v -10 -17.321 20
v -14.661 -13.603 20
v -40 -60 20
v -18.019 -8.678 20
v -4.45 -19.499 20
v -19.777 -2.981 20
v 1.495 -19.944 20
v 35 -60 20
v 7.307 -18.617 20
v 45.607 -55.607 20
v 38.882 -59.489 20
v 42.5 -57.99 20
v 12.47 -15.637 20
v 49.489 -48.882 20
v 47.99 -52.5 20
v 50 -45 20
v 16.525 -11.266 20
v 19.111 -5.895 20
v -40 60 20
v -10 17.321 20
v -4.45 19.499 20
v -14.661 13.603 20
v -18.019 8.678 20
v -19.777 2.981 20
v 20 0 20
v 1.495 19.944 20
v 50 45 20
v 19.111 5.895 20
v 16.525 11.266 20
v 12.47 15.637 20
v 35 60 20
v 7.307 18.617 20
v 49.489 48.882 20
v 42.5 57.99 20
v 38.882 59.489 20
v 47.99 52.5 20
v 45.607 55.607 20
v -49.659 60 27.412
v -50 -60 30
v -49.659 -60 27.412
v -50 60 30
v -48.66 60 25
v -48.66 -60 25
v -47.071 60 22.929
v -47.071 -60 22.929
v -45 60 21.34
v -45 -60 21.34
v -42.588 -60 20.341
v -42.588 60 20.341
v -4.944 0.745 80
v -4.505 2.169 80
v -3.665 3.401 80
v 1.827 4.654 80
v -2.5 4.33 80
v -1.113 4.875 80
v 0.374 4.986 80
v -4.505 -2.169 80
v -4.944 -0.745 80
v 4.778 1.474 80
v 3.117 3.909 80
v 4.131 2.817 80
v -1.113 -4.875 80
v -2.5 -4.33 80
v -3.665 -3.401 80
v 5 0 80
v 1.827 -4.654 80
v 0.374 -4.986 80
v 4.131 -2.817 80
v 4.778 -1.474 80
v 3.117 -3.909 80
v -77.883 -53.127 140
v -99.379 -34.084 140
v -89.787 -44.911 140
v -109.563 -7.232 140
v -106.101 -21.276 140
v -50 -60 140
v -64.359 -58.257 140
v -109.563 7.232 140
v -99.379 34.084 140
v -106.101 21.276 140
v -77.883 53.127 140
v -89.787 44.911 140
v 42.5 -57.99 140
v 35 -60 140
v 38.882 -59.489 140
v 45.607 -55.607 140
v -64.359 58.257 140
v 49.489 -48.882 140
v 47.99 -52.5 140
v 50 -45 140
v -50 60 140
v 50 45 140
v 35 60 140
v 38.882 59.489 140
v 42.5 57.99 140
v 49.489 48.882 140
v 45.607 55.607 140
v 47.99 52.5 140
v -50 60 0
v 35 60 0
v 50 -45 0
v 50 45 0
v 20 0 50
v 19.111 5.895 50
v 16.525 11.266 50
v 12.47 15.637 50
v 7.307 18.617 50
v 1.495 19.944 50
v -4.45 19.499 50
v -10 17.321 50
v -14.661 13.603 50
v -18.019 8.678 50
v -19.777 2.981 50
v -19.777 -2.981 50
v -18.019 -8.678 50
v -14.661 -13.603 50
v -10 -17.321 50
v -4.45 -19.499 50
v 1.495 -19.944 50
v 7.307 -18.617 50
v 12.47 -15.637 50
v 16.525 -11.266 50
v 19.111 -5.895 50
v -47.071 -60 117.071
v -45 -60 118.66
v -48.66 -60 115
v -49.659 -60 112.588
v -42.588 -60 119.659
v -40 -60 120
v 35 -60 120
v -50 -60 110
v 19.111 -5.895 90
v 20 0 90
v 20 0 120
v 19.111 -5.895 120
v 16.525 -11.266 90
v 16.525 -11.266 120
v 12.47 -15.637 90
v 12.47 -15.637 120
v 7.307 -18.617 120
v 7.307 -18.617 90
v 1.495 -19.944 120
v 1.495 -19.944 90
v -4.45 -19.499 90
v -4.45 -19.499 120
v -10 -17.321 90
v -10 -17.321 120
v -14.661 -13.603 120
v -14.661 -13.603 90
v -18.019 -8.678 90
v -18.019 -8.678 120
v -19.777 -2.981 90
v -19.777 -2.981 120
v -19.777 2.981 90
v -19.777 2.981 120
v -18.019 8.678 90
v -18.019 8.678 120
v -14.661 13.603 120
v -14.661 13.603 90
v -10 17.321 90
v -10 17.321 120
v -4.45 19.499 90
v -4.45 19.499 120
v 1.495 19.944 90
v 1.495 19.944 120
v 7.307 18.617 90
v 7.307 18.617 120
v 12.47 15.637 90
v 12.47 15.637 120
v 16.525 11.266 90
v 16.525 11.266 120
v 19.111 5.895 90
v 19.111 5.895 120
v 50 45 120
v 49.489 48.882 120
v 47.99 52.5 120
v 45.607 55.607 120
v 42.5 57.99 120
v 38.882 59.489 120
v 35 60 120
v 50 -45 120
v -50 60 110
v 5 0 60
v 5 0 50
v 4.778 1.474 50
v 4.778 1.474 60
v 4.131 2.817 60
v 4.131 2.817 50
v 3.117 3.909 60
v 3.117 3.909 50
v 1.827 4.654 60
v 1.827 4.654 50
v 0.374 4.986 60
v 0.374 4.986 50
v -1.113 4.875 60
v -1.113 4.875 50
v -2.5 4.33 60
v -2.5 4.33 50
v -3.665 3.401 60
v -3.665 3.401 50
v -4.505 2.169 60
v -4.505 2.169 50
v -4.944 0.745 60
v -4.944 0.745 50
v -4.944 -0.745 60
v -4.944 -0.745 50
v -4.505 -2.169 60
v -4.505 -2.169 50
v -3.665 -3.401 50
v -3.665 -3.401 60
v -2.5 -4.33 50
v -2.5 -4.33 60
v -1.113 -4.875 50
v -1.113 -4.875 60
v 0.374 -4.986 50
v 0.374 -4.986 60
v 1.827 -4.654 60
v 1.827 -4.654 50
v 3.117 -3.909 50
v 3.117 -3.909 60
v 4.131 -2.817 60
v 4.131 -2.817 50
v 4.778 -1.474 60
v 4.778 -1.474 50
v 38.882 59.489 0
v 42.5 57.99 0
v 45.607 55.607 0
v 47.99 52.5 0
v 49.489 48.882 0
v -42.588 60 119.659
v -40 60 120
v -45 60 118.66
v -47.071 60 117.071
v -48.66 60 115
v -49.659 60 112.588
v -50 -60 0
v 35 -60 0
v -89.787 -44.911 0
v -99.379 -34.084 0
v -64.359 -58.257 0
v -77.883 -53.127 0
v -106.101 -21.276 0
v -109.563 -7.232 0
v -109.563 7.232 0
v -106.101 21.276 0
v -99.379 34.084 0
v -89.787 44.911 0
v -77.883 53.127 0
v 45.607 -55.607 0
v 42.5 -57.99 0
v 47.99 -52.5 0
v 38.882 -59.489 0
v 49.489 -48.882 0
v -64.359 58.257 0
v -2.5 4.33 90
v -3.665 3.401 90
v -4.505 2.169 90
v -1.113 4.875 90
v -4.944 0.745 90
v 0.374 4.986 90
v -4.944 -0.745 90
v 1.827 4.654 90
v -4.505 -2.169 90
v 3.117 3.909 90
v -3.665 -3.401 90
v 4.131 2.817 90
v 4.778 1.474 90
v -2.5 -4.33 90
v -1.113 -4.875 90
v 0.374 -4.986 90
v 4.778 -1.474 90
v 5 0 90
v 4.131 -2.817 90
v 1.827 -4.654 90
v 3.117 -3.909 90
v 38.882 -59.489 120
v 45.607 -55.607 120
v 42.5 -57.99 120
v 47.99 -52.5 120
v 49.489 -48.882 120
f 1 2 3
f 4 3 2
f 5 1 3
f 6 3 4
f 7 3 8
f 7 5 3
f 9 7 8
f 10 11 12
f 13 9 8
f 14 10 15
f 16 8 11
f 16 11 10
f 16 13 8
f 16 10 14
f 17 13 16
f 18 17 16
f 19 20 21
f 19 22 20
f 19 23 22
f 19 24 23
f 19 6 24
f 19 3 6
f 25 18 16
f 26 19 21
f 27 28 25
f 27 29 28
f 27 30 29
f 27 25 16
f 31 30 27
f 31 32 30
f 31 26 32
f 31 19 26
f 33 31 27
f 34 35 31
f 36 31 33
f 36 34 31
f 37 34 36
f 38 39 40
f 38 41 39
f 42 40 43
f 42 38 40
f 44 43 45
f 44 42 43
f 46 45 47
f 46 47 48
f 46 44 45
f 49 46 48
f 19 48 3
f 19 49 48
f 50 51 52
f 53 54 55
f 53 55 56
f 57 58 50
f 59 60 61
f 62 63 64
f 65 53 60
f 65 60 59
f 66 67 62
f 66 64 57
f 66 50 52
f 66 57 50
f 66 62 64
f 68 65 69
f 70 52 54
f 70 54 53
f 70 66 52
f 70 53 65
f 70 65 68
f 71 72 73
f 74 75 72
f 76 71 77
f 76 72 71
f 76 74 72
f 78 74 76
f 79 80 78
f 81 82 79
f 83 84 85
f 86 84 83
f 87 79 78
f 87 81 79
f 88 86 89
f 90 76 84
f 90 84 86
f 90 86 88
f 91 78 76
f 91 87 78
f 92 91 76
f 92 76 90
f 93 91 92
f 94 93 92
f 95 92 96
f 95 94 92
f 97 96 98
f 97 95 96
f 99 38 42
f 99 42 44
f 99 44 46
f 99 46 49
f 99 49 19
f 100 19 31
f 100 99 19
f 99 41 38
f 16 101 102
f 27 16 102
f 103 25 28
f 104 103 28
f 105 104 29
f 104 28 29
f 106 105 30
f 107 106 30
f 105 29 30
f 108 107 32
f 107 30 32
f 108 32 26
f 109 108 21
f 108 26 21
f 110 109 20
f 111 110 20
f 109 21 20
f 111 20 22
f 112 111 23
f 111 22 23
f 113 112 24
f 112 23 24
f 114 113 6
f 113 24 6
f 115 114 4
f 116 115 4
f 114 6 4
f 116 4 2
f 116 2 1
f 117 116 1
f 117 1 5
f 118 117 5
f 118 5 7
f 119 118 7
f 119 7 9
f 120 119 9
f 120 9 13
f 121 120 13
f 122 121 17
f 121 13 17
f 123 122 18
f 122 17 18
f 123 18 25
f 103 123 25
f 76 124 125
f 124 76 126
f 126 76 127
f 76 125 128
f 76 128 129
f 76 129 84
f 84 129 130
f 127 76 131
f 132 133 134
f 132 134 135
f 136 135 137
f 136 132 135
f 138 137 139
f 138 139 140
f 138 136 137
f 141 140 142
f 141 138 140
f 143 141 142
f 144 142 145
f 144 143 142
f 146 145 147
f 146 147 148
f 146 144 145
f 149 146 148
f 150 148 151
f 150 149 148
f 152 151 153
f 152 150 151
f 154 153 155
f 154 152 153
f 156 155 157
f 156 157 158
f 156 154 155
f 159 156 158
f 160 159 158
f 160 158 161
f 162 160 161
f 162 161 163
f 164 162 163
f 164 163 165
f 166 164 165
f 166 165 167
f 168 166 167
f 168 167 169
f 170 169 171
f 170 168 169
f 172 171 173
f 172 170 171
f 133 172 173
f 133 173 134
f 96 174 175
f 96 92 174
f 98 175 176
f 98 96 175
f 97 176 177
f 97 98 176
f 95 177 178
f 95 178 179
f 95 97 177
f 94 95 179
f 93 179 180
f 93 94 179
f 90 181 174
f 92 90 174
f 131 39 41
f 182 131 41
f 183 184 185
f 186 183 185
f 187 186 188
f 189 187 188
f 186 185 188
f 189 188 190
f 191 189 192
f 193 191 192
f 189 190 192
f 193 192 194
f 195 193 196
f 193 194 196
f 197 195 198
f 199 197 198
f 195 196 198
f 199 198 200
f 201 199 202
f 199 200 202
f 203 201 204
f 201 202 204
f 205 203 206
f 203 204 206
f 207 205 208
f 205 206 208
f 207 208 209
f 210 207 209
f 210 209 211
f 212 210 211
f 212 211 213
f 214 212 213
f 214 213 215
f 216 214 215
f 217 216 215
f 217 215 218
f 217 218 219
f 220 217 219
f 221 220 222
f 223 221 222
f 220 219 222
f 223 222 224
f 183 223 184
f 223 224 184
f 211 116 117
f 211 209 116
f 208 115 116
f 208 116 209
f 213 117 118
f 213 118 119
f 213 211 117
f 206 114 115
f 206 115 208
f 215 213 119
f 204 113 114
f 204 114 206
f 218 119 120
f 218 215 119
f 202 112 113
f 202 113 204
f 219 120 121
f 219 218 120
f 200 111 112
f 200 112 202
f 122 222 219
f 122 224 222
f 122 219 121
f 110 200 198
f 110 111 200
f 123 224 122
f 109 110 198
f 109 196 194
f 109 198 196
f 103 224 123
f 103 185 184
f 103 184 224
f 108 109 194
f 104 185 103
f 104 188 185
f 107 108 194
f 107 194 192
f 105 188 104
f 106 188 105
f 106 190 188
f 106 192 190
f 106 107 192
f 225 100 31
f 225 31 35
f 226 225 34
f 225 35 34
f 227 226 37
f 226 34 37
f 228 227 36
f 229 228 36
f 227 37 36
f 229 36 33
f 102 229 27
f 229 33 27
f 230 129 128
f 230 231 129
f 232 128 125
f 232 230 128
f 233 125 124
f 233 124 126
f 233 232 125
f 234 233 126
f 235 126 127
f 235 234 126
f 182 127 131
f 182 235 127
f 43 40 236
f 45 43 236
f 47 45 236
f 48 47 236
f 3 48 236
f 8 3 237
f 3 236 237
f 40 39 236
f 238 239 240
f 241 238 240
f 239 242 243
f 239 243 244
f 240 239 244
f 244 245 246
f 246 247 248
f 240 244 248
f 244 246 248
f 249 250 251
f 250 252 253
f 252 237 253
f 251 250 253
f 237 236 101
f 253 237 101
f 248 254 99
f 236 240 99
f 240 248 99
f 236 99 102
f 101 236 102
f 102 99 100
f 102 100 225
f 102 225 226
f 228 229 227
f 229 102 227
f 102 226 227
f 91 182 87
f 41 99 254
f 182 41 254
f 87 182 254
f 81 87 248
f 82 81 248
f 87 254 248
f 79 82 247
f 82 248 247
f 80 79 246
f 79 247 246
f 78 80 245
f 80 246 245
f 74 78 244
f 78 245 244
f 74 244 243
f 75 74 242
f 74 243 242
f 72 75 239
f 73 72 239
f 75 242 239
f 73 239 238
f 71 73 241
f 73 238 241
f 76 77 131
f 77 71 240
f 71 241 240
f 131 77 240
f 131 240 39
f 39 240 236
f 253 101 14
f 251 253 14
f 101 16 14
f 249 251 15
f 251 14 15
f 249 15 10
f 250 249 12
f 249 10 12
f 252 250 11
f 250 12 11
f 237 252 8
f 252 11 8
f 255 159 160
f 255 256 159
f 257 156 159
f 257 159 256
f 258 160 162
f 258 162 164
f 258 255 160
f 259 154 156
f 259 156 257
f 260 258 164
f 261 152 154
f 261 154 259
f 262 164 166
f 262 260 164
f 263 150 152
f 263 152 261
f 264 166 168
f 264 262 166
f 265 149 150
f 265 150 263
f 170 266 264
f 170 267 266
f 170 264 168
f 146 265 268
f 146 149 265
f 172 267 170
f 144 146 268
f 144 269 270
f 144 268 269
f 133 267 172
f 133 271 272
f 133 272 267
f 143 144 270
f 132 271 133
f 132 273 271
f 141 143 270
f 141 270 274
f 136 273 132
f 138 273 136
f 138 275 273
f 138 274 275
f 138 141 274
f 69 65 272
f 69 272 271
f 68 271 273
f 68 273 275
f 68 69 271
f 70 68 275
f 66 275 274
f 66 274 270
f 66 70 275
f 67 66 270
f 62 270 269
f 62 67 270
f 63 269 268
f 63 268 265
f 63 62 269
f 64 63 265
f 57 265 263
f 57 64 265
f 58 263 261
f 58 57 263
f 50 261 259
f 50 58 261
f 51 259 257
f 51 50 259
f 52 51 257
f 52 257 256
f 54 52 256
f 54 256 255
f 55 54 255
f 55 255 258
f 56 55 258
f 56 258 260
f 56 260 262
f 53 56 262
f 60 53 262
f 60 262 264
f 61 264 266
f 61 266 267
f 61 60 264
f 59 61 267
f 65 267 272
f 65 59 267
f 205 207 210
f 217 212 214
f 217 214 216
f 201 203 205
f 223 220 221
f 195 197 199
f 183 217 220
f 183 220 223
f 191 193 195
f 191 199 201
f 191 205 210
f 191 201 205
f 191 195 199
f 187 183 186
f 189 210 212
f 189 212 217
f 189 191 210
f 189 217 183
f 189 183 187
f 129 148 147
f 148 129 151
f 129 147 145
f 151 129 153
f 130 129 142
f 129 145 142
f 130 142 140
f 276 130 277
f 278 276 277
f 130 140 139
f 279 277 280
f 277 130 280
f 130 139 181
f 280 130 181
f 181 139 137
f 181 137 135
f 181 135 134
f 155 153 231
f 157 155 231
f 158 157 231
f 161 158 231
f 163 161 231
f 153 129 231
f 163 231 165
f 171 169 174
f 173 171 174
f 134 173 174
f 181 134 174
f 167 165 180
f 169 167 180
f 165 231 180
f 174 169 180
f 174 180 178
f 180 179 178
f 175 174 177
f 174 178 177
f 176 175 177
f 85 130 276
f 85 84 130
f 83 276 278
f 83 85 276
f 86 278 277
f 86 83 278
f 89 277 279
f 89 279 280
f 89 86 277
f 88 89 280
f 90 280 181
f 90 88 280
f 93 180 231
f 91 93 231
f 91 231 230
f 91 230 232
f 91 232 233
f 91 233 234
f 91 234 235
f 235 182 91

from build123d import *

# Parameters (mm, degrees)
IZIM1_W                     = 100
IZIM1_H                     = 120
Y_KSEKLIK_EKSTR_ZYON1_DEPTH = 20
Y_KSEKLIK_EKSTR_ZYON2_DEPTH = 120
Y_KSEKLIK_EKSTR_ZYON3_DEPTH = 20
RADYUS1_R                   = 10
RADYUS2_R                   = 15
IZIM3_R                     = 20
Y_KSEKLIK_EKSTR_ZYON4_DEPTH = 30
IZIM4_R                     = 5
Y_KSEKLIK_EKSTR_ZYON5_DEPTH = 10
Y_KSEKLIK_EKSTR_ZYON6_START = 30
IZIM5_R                     = 20
Y_KSEKLIK_EKSTR_ZYON6_DEPTH = 30
Y_KSEKLIK_EKSTR_ZYON7_START = 10
IZIM6_R                     = 5
Y_KSEKLIK_EKSTR_ZYON7_DEPTH = 10


with BuildPart() as part:
    # Çizim1 → Yükseklik-Ekstrüzyon1 (new body)
    with BuildSketch(Plane.XY):
        Rectangle(IZIM1_W, IZIM1_H)
    extrude(amount=Y_KSEKLIK_EKSTR_ZYON1_DEPTH)

    # Çizim1<3> → Yükseklik-Ekstrüzyon2 (add)
    with BuildSketch(Plane.XY):
        with BuildLine():
            Line((-50, -60), (-50, 60))
            ThreePointArc((-50, 60), (-110, 0), (-50, -60))
        make_face()
    extrude(amount=Y_KSEKLIK_EKSTR_ZYON2_DEPTH)

    # Çizim2 → Yükseklik-Ekstrüzyon3 (add)
    with BuildSketch(Plane.XY.offset(120)):
        with BuildLine():
            Line((-50, -60), (50, -60))
            Line((50, -60), (50, 60))
            Line((50, 60), (-50, 60))
            ThreePointArc((-50, 60), (-110, 0), (-50, -60))
        make_face()
    extrude(amount=Y_KSEKLIK_EKSTR_ZYON3_DEPTH)

    # Radyus1
    radyus1_edges = [part.edges().sort_by_distance(p)[0] for p in [
        (-50, 0, 120),
        (-50, 0, 20),
    ]]
    fillet(radyus1_edges, radius=RADYUS1_R)

    # Radyus2
    radyus2_edges = [part.edges().sort_by_distance(p)[0] for p in [
        (50, -60, 130),
        (50, 60, 130),
        (50, 60, 10),
        (50, -60, 10),
    ]]
    fillet(radyus2_edges, radius=RADYUS2_R)

    # Çizim3 → Yükseklik-Ekstrüzyon4 (add)
    with BuildSketch(Plane.XY.offset(20)):
        Circle(IZIM3_R)
    extrude(amount=Y_KSEKLIK_EKSTR_ZYON4_DEPTH)

    # Çizim4 → Yükseklik-Ekstrüzyon5 (add)
    with BuildSketch(Plane.XY.offset(50)):
        Circle(IZIM4_R)
    extrude(amount=Y_KSEKLIK_EKSTR_ZYON5_DEPTH)

    # Çizim5 → Yükseklik-Ekstrüzyon6 (add)
    with BuildSketch(Plane(origin=(0, 0, 120), x_dir=(1, 0, 0), z_dir=(0, 0, -1)).offset(Y_KSEKLIK_EKSTR_ZYON6_START)):
        Circle(IZIM5_R)
    extrude(amount=-Y_KSEKLIK_EKSTR_ZYON6_DEPTH)

    # Çizim6 → Yükseklik-Ekstrüzyon7 (add)
    with BuildSketch(Plane(origin=(0, 0, 90), x_dir=(1, 0, 0), z_dir=(0, 0, -1)).offset(Y_KSEKLIK_EKSTR_ZYON7_START)):
        Circle(IZIM6_R)
    extrude(amount=-Y_KSEKLIK_EKSTR_ZYON7_DEPTH)


solid = part.part
